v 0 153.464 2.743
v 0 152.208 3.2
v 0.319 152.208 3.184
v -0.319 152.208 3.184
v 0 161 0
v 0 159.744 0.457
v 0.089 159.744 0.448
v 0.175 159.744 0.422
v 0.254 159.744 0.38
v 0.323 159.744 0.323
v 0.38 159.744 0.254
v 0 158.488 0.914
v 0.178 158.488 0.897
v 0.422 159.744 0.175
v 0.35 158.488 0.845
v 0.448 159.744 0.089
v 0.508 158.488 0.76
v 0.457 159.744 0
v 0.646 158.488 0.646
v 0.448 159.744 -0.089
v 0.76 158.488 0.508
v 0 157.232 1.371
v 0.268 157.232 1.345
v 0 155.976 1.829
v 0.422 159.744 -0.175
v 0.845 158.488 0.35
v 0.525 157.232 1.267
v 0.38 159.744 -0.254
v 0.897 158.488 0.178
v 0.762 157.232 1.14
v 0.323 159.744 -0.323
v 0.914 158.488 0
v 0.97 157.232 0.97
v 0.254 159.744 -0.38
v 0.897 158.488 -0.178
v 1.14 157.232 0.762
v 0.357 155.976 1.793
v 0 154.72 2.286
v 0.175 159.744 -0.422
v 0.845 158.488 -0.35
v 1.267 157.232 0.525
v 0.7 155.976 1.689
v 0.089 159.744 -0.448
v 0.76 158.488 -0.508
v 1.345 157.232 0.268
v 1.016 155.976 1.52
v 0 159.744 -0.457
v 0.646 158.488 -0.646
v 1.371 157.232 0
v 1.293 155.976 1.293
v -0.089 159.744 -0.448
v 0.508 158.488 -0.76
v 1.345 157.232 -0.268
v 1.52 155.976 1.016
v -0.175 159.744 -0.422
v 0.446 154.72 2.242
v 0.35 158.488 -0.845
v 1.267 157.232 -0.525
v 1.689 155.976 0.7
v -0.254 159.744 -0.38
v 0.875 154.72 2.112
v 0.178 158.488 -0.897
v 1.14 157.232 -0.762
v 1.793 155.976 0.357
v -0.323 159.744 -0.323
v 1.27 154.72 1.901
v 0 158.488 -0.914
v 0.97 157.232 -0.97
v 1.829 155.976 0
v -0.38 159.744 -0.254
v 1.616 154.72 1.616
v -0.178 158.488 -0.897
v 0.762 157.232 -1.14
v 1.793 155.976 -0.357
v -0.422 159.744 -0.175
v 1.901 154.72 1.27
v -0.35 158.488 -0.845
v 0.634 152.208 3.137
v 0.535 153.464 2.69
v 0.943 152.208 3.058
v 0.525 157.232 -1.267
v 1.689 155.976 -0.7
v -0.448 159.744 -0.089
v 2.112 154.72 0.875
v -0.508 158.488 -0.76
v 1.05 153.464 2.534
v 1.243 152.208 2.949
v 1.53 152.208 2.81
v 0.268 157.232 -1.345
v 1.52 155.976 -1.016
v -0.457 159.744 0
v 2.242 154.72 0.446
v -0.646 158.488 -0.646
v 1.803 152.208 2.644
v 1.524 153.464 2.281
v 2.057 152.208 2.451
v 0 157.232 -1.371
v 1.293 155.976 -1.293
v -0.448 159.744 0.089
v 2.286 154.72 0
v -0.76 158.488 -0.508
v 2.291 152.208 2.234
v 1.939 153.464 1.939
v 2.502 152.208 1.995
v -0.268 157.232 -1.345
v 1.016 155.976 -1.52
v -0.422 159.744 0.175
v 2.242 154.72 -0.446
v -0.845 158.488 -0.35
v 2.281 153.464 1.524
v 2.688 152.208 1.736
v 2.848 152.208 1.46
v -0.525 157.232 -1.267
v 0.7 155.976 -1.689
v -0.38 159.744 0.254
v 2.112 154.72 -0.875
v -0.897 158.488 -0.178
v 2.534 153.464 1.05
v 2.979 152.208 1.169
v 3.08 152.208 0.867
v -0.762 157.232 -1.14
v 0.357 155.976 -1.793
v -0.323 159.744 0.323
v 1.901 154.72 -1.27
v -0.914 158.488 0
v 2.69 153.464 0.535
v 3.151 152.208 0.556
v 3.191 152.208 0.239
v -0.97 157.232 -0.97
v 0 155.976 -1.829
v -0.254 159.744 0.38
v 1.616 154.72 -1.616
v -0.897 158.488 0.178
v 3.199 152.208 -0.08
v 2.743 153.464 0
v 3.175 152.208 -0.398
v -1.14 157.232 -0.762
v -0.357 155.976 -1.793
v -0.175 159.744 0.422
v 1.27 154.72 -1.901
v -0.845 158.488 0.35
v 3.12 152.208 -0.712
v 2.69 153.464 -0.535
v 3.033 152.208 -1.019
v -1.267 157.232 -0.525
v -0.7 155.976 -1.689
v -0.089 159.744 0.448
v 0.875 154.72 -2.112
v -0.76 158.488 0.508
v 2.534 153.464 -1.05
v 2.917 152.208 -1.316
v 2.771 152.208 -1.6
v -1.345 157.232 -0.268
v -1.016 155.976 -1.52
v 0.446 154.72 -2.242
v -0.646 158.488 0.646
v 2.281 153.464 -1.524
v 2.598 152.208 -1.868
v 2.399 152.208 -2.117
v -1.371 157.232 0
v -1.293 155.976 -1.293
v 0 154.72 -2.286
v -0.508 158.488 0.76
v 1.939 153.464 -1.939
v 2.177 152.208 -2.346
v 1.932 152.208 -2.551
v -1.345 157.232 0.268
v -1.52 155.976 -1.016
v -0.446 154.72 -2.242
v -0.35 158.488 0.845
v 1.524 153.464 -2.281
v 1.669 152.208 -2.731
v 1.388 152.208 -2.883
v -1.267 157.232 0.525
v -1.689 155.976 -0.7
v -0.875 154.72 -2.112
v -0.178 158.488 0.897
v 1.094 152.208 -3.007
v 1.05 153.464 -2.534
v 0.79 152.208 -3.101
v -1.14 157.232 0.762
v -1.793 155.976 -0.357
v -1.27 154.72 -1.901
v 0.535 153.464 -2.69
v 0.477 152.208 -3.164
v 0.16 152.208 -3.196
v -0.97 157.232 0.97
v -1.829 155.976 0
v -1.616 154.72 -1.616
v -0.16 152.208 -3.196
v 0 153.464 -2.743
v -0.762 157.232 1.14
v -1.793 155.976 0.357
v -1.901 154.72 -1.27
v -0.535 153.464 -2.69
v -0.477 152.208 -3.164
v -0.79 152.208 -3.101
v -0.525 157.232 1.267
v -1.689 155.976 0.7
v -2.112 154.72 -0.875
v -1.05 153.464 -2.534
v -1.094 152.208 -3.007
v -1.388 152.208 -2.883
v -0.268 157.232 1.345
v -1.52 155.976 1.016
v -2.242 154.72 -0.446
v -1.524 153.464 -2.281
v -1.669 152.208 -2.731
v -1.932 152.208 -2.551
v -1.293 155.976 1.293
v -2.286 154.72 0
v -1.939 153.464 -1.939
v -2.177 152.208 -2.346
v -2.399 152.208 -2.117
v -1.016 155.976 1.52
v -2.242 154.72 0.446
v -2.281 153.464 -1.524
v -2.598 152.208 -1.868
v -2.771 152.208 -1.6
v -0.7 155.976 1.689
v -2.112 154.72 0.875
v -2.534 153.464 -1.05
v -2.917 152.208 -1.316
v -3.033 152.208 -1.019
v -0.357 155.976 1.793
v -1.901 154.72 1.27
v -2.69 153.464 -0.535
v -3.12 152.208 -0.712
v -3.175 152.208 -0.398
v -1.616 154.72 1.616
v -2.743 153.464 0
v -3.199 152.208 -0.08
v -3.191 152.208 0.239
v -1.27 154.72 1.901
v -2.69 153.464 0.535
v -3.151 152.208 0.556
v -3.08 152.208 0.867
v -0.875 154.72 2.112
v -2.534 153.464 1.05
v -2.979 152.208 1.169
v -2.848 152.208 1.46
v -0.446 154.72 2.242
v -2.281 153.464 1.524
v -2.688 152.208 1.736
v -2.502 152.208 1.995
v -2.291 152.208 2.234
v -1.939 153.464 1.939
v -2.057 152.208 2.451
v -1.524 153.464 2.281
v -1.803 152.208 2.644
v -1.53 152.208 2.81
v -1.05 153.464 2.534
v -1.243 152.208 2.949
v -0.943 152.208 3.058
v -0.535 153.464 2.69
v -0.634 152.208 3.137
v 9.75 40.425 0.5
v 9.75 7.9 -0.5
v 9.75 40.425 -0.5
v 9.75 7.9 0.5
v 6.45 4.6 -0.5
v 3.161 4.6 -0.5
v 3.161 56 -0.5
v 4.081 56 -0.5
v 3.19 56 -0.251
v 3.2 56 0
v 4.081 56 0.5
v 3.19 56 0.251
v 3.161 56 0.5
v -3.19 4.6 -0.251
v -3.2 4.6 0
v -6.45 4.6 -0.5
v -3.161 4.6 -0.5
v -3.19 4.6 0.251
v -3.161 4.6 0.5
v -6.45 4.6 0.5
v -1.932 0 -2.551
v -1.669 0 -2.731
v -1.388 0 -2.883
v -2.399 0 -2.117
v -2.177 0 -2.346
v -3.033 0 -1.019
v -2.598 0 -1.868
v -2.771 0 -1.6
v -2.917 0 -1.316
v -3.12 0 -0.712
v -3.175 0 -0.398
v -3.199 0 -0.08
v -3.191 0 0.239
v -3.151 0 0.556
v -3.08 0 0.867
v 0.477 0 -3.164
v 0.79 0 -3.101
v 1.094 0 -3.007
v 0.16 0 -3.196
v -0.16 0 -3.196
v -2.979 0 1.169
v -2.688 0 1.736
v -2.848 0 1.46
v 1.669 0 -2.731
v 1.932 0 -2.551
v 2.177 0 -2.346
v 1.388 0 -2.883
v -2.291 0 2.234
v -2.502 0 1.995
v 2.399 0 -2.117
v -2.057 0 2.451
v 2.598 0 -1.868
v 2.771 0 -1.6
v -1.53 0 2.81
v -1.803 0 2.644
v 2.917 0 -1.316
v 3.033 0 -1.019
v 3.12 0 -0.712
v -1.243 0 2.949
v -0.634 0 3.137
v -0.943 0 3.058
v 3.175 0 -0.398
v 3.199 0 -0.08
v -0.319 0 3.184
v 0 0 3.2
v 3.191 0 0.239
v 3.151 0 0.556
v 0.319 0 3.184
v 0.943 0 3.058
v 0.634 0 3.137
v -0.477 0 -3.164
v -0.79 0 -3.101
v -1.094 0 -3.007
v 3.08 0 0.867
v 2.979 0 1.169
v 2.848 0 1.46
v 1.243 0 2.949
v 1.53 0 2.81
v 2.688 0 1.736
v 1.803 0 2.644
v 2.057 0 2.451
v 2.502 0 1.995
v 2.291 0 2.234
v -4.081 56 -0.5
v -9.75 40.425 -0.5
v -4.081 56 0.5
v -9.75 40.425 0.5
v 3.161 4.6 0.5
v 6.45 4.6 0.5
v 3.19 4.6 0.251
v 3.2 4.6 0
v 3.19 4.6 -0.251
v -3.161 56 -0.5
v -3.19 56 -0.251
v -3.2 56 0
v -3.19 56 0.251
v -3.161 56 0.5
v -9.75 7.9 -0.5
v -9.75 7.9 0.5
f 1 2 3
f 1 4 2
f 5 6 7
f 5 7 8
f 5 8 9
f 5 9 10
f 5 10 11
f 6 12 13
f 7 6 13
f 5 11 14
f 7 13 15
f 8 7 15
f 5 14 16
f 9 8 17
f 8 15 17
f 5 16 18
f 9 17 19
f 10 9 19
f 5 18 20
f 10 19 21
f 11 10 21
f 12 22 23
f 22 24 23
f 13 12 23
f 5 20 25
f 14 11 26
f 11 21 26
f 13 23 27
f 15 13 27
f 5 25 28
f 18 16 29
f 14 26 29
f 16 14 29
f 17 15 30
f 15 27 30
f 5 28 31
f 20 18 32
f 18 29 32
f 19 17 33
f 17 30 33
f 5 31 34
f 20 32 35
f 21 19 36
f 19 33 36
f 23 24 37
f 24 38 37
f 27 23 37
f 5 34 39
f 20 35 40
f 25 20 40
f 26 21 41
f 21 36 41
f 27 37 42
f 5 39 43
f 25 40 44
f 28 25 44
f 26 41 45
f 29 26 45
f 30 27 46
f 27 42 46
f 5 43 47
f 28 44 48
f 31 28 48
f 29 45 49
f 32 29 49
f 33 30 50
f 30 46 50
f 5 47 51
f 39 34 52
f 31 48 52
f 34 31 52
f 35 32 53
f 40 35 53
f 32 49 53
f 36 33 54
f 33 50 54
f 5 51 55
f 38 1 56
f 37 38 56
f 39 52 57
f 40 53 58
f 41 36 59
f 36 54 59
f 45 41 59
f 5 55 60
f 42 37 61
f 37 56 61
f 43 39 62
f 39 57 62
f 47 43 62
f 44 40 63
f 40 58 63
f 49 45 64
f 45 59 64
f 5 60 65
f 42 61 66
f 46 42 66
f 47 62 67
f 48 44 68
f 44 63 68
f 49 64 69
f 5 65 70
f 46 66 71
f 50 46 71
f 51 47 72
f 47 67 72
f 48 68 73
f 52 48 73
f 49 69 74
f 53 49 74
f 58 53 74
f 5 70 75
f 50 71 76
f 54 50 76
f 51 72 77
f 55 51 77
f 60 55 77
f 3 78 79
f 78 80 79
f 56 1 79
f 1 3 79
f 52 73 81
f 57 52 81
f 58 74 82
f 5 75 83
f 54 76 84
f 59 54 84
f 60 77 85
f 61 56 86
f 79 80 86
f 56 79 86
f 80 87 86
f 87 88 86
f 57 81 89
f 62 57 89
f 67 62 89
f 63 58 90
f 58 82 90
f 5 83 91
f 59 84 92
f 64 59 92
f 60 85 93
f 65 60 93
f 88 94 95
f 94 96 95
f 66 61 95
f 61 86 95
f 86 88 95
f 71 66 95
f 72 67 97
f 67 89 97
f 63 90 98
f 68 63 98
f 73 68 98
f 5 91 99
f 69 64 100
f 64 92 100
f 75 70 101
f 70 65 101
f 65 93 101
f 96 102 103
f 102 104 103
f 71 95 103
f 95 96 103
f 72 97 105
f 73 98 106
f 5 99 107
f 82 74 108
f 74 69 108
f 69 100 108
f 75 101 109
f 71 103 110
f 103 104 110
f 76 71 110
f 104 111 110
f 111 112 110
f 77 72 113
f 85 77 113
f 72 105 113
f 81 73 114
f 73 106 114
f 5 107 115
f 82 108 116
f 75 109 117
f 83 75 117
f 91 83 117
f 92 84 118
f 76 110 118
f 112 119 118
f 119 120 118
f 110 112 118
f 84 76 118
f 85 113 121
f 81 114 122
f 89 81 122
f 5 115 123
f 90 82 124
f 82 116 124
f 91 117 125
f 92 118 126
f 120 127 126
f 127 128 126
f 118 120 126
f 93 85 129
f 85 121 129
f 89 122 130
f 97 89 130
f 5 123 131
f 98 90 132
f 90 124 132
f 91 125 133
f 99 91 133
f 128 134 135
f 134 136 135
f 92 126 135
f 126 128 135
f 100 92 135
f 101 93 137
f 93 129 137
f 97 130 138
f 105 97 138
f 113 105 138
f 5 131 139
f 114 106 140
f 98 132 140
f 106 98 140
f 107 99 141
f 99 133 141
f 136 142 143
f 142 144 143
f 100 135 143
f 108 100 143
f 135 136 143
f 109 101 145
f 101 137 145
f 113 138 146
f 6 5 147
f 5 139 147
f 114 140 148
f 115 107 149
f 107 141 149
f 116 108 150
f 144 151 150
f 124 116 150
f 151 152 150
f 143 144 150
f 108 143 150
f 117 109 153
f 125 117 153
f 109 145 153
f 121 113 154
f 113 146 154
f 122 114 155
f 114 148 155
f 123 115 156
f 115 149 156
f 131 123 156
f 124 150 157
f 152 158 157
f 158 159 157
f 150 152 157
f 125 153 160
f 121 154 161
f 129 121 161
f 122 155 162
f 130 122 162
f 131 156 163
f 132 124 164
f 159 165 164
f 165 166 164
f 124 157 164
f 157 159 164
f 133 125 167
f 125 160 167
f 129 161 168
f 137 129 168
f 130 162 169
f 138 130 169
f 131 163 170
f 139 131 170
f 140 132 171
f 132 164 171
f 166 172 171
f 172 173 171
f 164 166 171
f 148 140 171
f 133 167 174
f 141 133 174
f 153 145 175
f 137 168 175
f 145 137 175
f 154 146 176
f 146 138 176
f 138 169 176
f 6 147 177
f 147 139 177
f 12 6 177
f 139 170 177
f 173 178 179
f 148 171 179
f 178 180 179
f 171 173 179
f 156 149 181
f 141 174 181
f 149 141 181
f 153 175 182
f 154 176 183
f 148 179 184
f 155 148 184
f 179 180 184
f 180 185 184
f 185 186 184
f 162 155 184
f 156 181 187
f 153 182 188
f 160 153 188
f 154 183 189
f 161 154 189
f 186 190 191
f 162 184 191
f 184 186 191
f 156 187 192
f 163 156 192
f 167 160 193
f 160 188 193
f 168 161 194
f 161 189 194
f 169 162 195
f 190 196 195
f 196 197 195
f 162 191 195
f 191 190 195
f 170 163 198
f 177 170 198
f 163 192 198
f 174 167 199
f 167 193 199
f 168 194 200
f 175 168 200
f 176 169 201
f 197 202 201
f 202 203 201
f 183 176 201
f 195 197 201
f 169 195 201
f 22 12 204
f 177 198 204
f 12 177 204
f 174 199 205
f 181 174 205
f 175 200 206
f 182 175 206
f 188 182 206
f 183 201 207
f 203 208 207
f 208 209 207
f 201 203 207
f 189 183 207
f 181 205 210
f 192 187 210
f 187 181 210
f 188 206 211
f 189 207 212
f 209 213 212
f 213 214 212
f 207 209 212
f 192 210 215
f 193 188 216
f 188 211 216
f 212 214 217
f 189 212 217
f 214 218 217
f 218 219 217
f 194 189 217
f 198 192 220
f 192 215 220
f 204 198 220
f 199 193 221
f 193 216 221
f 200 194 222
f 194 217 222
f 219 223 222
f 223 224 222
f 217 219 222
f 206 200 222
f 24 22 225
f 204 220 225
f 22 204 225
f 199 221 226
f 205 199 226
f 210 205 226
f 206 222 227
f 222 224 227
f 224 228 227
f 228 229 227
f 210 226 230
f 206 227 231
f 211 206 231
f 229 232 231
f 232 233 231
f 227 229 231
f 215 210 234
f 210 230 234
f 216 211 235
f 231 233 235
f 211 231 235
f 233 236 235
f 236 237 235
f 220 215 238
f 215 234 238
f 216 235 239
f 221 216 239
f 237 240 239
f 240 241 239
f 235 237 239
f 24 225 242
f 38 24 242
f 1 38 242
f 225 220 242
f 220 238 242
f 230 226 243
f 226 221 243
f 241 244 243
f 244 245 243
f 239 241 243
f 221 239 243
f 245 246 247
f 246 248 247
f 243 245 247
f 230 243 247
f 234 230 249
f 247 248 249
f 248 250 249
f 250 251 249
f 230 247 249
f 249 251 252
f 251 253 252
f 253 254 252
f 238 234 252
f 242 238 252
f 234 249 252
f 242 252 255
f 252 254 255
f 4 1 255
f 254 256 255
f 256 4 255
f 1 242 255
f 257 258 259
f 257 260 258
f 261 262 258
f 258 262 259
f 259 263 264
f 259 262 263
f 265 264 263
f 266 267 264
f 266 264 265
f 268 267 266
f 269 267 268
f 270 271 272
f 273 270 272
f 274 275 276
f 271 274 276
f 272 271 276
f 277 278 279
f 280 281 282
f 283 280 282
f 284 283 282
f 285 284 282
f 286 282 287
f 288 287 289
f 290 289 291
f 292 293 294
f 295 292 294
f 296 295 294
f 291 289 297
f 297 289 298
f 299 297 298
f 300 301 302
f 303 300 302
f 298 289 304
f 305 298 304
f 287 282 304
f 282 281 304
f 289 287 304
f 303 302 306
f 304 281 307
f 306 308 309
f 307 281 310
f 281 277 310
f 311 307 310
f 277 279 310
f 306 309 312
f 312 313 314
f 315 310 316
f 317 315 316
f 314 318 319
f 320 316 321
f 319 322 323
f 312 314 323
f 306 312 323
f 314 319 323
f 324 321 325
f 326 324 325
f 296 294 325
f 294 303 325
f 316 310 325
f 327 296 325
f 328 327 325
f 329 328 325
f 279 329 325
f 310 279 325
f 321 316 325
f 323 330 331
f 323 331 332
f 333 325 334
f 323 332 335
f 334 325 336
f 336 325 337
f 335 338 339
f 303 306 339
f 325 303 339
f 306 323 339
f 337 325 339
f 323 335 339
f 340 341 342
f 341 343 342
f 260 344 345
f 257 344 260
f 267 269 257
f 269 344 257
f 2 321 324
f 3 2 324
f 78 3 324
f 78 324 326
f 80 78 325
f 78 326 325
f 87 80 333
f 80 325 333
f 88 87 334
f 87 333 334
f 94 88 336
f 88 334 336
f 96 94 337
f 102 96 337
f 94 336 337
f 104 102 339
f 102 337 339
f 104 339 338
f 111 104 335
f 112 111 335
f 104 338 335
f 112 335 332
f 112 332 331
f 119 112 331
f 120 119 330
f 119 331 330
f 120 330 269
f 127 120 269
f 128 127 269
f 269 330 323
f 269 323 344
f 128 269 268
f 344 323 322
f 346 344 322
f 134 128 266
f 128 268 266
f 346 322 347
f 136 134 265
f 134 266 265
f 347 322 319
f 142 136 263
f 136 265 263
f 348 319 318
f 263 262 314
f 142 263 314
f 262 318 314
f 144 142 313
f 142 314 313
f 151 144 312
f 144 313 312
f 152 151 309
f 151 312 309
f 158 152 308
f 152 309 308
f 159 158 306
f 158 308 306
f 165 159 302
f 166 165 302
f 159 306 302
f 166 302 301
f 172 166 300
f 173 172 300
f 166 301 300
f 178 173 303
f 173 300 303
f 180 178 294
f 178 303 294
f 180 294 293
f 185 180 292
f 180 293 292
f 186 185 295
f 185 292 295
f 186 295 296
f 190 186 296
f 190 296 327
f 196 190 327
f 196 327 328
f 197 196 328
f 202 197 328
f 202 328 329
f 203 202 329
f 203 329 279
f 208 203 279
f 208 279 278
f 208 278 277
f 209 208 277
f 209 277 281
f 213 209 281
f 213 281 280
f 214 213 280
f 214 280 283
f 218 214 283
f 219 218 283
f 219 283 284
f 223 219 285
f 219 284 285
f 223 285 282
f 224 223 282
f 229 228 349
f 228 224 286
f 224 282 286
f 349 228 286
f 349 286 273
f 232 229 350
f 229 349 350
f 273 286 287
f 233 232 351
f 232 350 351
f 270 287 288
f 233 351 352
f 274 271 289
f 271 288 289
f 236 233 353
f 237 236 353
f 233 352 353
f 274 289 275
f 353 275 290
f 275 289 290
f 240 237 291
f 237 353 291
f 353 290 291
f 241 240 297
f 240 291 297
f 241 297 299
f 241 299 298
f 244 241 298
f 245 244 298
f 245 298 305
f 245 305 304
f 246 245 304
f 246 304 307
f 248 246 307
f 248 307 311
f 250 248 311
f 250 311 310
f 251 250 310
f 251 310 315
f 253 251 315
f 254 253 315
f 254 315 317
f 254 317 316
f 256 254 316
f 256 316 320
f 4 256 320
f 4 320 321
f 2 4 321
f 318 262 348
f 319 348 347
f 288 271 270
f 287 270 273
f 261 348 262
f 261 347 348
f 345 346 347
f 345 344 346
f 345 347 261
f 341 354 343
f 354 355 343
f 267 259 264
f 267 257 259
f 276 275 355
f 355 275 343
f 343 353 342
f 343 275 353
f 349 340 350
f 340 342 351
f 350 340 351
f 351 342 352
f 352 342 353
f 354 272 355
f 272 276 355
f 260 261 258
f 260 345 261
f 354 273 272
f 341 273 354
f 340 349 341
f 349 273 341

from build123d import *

# Parameters (mm, degrees)
SKETCH1_R           = 3.2
BOSS_EXTRUDE1_DEPTH = 161
CHAMFER1_SIZE       = 3.2
CHAMFER1_SIZE2      = 8.791927742
FLETCHING_DEPTH     = 0.5


with BuildPart() as part:
    # Sketch1 → Boss-Extrude1 (new body)
    with BuildSketch(Plane(origin=(0, 0, 0), x_dir=(1, 0, 0), z_dir=(0, 1, 0))):
        with Locations(Location((0, 0, 0), (0, 0, 270))):
            Circle(SKETCH1_R)
    extrude(amount=BOSS_EXTRUDE1_DEPTH)

    # Chamfer1
    chamfer1_edges = [part.edges().sort_by_distance(p)[0] for p in [
        (0, 161, -3.2),
    ]]
    chamfer1_side = [part.faces().sort_by_distance(p)[0] for p in [
        (0, 161, 0),
    ]]
    chamfer(chamfer1_edges, length=CHAMFER1_SIZE, length2=CHAMFER1_SIZE2, reference=chamfer1_side[0])

    # Sketch2 → Fletching (add, symmetric)
    with BuildSketch(Plane.XY):
        Polygon((0, 4.6), (-6.45, 4.6), (-9.75, 7.9), (-9.75, 40.425060307), (-4.081185551, 56), (0, 56), align=None)
    fletching = extrude(amount=FLETCHING_DEPTH, both=True)

    # Fletchings: Fletching across plane
    add(fletching.mirror(Plane(origin=(0, 0, 0), x_dir=(0, 0, 1), z_dir=(1, 0, 0))))


solid = part.part
